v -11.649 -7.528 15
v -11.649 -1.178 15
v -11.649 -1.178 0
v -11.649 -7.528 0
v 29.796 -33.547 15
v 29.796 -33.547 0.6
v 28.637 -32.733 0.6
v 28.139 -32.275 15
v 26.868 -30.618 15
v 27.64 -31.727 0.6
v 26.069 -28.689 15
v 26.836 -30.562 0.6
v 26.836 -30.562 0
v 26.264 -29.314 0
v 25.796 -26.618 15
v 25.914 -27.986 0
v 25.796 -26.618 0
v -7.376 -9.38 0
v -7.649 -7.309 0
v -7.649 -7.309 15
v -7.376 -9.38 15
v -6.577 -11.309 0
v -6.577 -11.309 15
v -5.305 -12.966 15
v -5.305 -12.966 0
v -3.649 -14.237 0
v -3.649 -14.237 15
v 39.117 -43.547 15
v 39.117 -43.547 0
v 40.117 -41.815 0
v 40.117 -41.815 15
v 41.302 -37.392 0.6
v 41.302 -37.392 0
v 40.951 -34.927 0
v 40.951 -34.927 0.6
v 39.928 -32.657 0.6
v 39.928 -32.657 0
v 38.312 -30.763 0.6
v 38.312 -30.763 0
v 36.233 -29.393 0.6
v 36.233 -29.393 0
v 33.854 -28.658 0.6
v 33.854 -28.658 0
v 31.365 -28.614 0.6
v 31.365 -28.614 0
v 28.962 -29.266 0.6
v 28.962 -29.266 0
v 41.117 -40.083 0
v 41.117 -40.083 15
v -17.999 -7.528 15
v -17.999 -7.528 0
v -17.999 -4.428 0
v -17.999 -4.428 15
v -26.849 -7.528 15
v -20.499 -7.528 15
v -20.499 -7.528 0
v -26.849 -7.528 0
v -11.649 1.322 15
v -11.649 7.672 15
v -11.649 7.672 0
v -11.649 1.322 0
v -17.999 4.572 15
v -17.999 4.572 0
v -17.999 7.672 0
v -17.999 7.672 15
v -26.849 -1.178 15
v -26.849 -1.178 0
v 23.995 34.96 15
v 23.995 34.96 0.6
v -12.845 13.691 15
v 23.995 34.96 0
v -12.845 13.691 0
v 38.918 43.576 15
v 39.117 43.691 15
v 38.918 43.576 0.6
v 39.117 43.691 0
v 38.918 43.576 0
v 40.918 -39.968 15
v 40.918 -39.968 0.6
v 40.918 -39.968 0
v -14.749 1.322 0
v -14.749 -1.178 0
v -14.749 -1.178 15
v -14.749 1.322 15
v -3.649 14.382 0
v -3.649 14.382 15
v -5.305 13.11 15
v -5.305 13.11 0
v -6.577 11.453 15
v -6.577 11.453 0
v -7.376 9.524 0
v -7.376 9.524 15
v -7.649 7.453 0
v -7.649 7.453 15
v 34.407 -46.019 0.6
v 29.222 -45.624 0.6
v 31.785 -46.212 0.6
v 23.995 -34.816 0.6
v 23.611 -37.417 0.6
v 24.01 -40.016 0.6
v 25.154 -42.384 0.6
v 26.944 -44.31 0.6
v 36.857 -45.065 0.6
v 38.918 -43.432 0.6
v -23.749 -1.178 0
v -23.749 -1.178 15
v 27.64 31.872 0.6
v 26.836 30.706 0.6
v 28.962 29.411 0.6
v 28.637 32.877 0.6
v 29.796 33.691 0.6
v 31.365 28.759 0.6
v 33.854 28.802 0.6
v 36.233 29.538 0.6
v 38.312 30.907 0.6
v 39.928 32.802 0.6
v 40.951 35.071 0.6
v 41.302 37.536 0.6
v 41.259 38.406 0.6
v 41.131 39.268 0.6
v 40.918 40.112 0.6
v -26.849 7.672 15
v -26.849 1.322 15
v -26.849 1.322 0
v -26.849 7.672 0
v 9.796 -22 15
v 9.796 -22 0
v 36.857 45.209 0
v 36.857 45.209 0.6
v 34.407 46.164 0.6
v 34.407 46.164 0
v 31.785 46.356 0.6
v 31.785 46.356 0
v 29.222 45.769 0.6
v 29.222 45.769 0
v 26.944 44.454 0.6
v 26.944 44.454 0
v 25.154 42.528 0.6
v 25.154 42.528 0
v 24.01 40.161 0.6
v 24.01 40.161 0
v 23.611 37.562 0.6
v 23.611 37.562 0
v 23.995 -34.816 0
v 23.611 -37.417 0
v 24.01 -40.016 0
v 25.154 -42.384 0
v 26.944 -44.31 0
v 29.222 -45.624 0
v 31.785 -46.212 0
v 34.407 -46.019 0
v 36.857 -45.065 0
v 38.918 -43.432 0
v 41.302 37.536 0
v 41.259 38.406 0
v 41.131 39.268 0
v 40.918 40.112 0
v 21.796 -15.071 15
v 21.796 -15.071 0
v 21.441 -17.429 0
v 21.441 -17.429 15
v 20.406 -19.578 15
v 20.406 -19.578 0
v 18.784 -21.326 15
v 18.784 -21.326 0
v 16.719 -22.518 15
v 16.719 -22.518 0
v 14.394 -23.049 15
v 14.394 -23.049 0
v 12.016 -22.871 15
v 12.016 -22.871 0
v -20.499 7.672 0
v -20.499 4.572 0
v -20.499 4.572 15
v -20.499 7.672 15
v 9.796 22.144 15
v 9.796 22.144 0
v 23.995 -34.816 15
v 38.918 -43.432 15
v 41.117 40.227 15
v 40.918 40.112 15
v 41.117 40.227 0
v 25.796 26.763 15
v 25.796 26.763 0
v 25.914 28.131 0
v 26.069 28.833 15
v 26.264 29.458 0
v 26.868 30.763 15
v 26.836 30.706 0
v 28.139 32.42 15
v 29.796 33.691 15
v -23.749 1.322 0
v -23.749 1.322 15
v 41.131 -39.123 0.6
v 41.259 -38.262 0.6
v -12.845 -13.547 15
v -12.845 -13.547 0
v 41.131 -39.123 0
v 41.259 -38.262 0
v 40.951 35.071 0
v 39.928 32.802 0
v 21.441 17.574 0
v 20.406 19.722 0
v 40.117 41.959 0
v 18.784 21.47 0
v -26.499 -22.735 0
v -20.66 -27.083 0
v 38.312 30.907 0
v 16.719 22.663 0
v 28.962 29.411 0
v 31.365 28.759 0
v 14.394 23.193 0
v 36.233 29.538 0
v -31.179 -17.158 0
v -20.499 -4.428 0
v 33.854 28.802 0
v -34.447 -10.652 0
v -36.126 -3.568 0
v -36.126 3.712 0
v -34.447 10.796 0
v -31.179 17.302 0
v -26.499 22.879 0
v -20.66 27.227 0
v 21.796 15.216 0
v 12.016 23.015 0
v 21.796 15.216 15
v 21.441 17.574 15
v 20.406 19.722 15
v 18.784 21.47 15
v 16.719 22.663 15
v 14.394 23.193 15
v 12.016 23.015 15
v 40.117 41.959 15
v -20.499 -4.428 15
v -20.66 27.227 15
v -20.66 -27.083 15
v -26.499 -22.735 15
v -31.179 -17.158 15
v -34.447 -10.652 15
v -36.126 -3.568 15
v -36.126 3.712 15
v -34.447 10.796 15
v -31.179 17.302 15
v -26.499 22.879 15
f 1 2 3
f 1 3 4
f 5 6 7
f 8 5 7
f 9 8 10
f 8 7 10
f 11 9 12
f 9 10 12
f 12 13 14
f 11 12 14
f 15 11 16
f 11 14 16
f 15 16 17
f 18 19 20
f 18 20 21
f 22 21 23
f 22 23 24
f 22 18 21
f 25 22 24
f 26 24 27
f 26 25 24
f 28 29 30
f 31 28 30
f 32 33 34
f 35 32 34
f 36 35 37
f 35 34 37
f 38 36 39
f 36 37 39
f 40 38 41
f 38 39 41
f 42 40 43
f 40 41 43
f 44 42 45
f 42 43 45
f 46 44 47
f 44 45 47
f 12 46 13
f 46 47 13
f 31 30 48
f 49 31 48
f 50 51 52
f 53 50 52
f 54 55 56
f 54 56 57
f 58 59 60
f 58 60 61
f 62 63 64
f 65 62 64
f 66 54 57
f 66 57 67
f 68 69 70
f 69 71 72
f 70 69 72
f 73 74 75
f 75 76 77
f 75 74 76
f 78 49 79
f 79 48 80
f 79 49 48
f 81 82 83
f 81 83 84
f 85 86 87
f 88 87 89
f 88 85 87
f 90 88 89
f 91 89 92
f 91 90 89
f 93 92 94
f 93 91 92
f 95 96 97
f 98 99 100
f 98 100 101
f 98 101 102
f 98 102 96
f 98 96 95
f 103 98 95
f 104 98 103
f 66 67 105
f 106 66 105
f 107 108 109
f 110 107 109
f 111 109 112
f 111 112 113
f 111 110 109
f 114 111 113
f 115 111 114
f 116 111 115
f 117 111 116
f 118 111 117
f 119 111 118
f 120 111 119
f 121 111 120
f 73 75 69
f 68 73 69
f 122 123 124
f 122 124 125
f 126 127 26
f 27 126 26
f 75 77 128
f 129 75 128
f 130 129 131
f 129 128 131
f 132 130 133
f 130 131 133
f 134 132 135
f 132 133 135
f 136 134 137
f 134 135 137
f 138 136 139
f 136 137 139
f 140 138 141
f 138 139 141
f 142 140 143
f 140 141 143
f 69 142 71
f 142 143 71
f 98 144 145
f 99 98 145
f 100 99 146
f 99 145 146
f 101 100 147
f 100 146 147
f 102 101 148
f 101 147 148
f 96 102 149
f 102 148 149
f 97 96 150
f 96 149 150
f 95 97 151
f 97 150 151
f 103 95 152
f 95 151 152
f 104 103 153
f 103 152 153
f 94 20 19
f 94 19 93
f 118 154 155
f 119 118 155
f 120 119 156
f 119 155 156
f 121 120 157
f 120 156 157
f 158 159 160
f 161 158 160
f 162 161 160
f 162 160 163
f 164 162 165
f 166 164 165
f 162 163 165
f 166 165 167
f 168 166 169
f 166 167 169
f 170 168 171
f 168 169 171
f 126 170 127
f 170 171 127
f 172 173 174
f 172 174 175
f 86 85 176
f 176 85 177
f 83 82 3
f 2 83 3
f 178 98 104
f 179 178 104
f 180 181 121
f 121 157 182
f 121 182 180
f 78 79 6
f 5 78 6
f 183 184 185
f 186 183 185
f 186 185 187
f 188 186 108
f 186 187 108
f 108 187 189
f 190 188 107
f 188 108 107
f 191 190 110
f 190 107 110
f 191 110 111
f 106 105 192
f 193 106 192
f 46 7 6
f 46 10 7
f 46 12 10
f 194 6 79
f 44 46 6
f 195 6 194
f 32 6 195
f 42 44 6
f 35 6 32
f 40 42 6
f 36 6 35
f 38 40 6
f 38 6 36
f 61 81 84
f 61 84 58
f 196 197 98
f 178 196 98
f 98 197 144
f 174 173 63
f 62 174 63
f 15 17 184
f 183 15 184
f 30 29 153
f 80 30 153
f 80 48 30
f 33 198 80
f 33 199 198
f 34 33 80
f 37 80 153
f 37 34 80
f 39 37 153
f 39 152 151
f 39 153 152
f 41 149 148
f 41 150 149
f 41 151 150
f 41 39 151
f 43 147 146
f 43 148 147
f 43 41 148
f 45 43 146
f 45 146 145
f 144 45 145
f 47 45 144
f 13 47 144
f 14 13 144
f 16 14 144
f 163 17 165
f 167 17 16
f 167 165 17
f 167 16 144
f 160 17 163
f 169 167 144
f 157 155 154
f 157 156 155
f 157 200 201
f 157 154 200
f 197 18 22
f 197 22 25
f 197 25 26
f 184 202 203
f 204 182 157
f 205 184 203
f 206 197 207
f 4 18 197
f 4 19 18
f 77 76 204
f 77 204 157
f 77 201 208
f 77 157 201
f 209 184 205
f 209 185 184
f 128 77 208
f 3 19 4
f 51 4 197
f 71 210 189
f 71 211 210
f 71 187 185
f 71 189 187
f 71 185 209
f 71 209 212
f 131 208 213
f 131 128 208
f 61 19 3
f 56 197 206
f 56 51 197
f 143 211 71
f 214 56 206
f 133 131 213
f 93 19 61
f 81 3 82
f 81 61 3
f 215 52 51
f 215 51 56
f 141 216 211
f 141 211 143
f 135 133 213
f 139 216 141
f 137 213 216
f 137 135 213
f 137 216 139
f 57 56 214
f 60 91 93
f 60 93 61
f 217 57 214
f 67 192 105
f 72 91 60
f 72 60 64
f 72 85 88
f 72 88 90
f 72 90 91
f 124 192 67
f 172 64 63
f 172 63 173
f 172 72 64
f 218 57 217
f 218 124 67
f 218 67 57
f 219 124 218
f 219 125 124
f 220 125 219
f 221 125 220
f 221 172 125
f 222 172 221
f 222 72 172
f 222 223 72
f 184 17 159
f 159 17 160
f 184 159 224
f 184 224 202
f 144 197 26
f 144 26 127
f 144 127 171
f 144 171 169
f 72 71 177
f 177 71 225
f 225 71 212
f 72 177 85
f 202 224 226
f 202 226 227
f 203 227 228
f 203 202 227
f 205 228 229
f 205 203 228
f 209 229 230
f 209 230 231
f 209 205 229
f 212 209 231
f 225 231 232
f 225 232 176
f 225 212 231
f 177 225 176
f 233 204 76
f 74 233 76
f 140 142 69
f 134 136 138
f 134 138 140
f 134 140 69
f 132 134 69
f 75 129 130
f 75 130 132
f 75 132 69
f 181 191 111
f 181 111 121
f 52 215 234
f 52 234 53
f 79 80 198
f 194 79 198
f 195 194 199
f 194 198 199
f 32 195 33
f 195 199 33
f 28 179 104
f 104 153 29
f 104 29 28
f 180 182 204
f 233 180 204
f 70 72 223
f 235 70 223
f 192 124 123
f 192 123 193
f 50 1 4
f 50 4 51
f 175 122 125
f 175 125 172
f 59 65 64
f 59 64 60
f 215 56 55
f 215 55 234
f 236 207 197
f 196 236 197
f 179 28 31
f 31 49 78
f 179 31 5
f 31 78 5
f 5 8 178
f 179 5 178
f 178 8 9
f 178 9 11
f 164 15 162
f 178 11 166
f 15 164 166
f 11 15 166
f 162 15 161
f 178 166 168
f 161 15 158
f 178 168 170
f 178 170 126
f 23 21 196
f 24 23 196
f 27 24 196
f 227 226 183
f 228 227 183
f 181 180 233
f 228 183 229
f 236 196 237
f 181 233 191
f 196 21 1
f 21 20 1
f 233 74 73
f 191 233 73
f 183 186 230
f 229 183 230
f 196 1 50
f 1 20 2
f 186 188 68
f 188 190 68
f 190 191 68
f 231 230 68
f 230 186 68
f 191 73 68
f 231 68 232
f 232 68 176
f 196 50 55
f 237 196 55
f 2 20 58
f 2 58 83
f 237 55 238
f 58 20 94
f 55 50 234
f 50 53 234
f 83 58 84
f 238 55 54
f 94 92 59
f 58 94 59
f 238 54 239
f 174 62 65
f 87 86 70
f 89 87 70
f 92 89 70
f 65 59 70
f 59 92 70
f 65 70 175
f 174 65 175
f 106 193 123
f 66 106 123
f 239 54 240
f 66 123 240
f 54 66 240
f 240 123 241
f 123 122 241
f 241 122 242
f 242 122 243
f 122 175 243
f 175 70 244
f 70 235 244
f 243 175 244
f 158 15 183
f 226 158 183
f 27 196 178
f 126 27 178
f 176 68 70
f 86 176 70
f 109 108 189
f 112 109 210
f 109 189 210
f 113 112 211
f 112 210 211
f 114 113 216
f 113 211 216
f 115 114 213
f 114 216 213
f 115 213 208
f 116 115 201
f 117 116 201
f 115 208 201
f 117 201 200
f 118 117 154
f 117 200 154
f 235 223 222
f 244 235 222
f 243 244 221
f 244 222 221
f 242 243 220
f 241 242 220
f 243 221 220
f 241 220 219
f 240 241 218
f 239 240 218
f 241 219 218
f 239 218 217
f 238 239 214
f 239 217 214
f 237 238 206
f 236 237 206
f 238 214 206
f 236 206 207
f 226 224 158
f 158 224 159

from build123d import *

# Parameters (mm, degrees)
F0_W        = 2.5
F0_H        = 3.1
F0_W_2      = 3.1
F0_H_2      = 2.5
F1_DEPTH    = 15
F2_DEPTH    = 0.6
F3_T1_DEPTH = 15


# Not quite as in the source:
# - a fillet or chamfer that OpenCascade refuses, or shapes differently, is made with other operations: its cross-section is extruded or revolved along the edge and cut away or added


with BuildPart() as f1:
    # F0 (on Top) → F1 (new body)
    with BuildSketch(Plane.XY):
        with BuildLine():
            Line((39.1167589883, 43.6909709372), (38.9183741482, 43.5764333963))
            ThreePointArc((38.9183741482, 43.5764333963), (39.563732113, 42.8018800146), (40.1167589265, 41.9589202367))
            Line((40.1167589265, 41.9589202367), (39.1167589883, 43.6909709372))
        make_face()
        with BuildLine():
            ThreePointArc((40.1167589265, -41.8145826694), (39.563732113, -42.6575424473), (38.9183741482, -43.432095829))
            Line((38.9183741482, -43.432095829), (39.1167589883, -43.5466333699))
            Line((39.1167589883, -43.5466333699), (40.1167589265, -41.8145826694))
        make_face()
        with BuildLine():
            Line((41.1167589883, 40.226869322), (40.1167589265, 41.9589202367))
            ThreePointArc((40.1167589265, 41.9589202367), (40.5702701762, 41.0585049774), (40.9183741482, 40.1123317812))
            Line((40.9183741482, 40.1123317812), (41.1167589883, 40.226869322))
        make_face()
        with BuildLine():
            Line((41.1167589883, -40.0825317547), (40.9183741482, -39.9679942139))
            ThreePointArc((40.9183741482, -39.9679942139), (40.5702701762, -40.9141674102), (40.1167589265, -41.8145826694))
            Line((40.1167589265, -41.8145826694), (41.1167589883, -40.0825317547))
        make_face()
        with BuildLine():
            Line((38.9183741482, 43.5764333963), (23.9946357527, 34.9602090164))
            ThreePointArc((23.9946357527, 34.9602090164), (24.7962509126, 33.113620668), (25.9946357527, 31.4961074012))
            Line((25.9946357527, 31.4961074012), (40.9183741482, 40.1123317812))
            ThreePointArc((40.9183741482, 40.1123317812), (40.5702701762, 41.0585049774), (40.1167589265, 41.9589202367))
            ThreePointArc((40.1167589265, 41.9589202367), (39.563732113, 42.8018800146), (38.9183741482, 43.5764333963))
        make_face()
        with BuildLine():
            ThreePointArc((25.9946357527, -31.3517698339), (24.7962509126, -32.9692831007), (23.9946357527, -34.8158714491))
            Line((23.9946357527, -34.8158714491), (38.9183741482, -43.432095829))
            ThreePointArc((38.9183741482, -43.432095829), (39.563732113, -42.6575424473), (40.1167589265, -41.8145826694))
            ThreePointArc((40.1167589265, -41.8145826694), (40.5702701762, -40.9141674102), (40.9183741482, -39.9679942139))
            Line((40.9183741482, -39.9679942139), (25.9946357527, -31.3517698339))
        make_face()
        with BuildLine():
            Line((23.9946357527, 34.9602090164), (-12.8447652387, 13.6909709372))
            Line((-12.8447652387, 13.6909709372), (-20.6597652387, 27.2269479983))
            ThreePointArc((-20.6597652387, 27.2269479983), (-36.3375843281, 0.0721687836), (-20.6597652387, -27.082610431))
            Line((-20.6597652387, -27.082610431), (-12.8447652387, -13.5466333699))
            Line((-12.8447652387, -13.5466333699), (23.9946357527, -34.8158714491))
            ThreePointArc((23.9946357527, -34.8158714491), (24.7962509126, -32.9692831007), (25.9946357527, -31.3517698339))
            Line((25.9946357527, -31.3517698339), (25.7962509126, -31.2372322931))
            Line((25.7962509126, -31.2372322931), (25.7962509126, 31.3815698604))
            Line((25.7962509126, 31.3815698604), (25.9946357527, 31.4961074012))
            ThreePointArc((25.9946357527, 31.4961074012), (24.7962509126, 33.113620668), (23.9946357527, 34.9602090164))
        make_face()
        Polygon((-7.648612816, -11.9278312164), (-7.648612816, 12.0721687836), (21.7962509126, 29.0721687836), (21.7962509126, -28.9278312164), align=None, mode=Mode.SUBTRACT)
        Polygon((-17.998612816, 7.6721687836), (-11.648612816, 7.6721687836), (-11.648612816, 1.3221687836), (-11.648612816, -1.1778312164), (-11.648612816, -7.5278312164), (-17.998612816, -7.5278312164), (-20.498612816, -7.5278312164), (-26.848612816, -7.5278312164), (-26.848612816, -1.1778312164), (-26.848612816, 1.3221687836), (-26.848612816, 7.6721687836), (-20.498612816, 7.6721687836), align=None, mode=Mode.SUBTRACT)
        with Locations((-19.248612816, -5.9778312164)):
            Rectangle(F0_W, F0_H)
        with Locations((-13.198612816, 0.0721687836)):
            Rectangle(F0_W_2, F0_H_2)
        with Locations((-19.248612816, 6.1221687836)):
            Rectangle(F0_W, F0_H)
        with Locations((-25.298612816, 0.0721687836)):
            Rectangle(F0_W_2, F0_H_2)
    extrude(amount=F1_DEPTH)

    # F0 (on Top) → F2 (join)
    with BuildSketch(Plane.XY):
        with BuildLine():
            ThreePointArc((38.9183741482, 43.5764333963), (28.0338552197, 45.1965244366), (23.9946357527, 34.9602090164))
            Line((23.9946357527, 34.9602090164), (38.9183741482, 43.5764333963))
        make_face()
        with BuildLine():
            Line((39.1167589883, 43.6909709372), (38.9183741482, 43.5764333963))
            ThreePointArc((38.9183741482, 43.5764333963), (39.563732113, 42.8018800146), (40.1167589265, 41.9589202367))
            Line((40.1167589265, 41.9589202367), (39.1167589883, 43.6909709372))
        make_face()
        with BuildLine():
            Line((38.9183741482, -43.432095829), (23.9946357527, -34.8158714491))
            ThreePointArc((23.9946357527, -34.8158714491), (28.0338552197, -45.0521868693), (38.9183741482, -43.432095829))
        make_face()
        with BuildLine():
            ThreePointArc((40.1167589265, -41.8145826694), (39.563732113, -42.6575424473), (38.9183741482, -43.432095829))
            Line((38.9183741482, -43.432095829), (39.1167589883, -43.5466333699))
            Line((39.1167589883, -43.5466333699), (40.1167589265, -41.8145826694))
        make_face()
        with BuildLine():
            Line((41.1167589883, 40.226869322), (40.1167589265, 41.9589202367))
            ThreePointArc((40.1167589265, 41.9589202367), (40.5702701762, 41.0585049774), (40.9183741482, 40.1123317812))
            Line((40.9183741482, 40.1123317812), (41.1167589883, 40.226869322))
        make_face()
        with BuildLine():
            Line((40.9183741482, 40.1123317812), (25.9946357527, 31.4961074012))
            ThreePointArc((25.9946357527, 31.4961074012), (35.7032074646, 29.3083760539), (41.3018044121, 37.5362703988))
            ThreePointArc((41.3018044121, 37.5362703988), (41.2054217299, 38.8384907155), (40.9183741482, 40.1123317812))
        make_face()
        with BuildLine():
            ThreePointArc((41.3018044121, -37.3919328315), (35.7032074646, -29.1640384866), (25.9946357527, -31.3517698339))
            Line((25.9946357527, -31.3517698339), (40.9183741482, -39.9679942139))
            ThreePointArc((40.9183741482, -39.9679942139), (41.2054217299, -38.6941531482), (41.3018044121, -37.3919328315))
        make_face()
        with BuildLine():
            Line((41.1167589883, -40.0825317547), (40.9183741482, -39.9679942139))
            ThreePointArc((40.9183741482, -39.9679942139), (40.5702701762, -40.9141674102), (40.1167589265, -41.8145826694))
            Line((40.1167589265, -41.8145826694), (41.1167589883, -40.0825317547))
        make_face()
    extrude(amount=F2_DEPTH)

    # F3: fillet of radius 8 on 6 edges, made by hand

    # F3_s2 → F3_t1 (join)
    with BuildSketch(Plane.XY):
        with BuildLine():
            ThreePointArc((-3.648612816, 14.3815698604), (-6.5768160463, 11.4533666301), (-7.648612816, 7.4533666301))
            Line((-7.648612816, 7.4533666301), (-7.648612816, 12.0721687836))
            Line((-7.648612816, 12.0721687836), (-3.648612816, 14.3815698604))
        make_face()
        with BuildLine():
            ThreePointArc((25.7962509126, 26.7627677069), (26.8680476824, 30.7627677069), (29.7962509126, 33.6909709372))
            Line((29.7962509126, 33.6909709372), (25.7962509126, 31.3815698604))
            Line((25.7962509126, 31.3815698604), (25.7962509126, 26.7627677069))
        make_face()
        with BuildLine():
            ThreePointArc((21.7962509126, 15.2157623231), (17.7962509126, 22.1439655534), (9.7962509126, 22.1439655534))
            Line((9.7962509126, 22.1439655534), (21.7962509126, 29.0721687836))
            Line((21.7962509126, 29.0721687836), (21.7962509126, 15.2157623231))
        make_face()
        with BuildLine():
            ThreePointArc((21.7962509126, -15.0714247558), (17.7962509126, -21.9996279861), (9.7962509126, -21.9996279861))
            Line((9.7962509126, -21.9996279861), (21.7962509126, -28.9278312164))
            Line((21.7962509126, -28.9278312164), (21.7962509126, -15.0714247558))
        make_face()
        with BuildLine():
            ThreePointArc((29.7962509126, -33.5466333699), (26.8680476824, -30.6184301396), (25.7962509126, -26.6184301396))
            Line((25.7962509126, -26.6184301396), (25.7962509126, -31.2372322931))
            Line((25.7962509126, -31.2372322931), (29.7962509126, -33.5466333699))
        make_face()
        with BuildLine():
            ThreePointArc((-7.648612816, -7.3090290628), (-6.5768160463, -11.3090290628), (-3.648612816, -14.2372322931))
            Line((-3.648612816, -14.2372322931), (-7.648612816, -11.9278312164))
            Line((-7.648612816, -11.9278312164), (-7.648612816, -7.3090290628))
        make_face()
    extrude(amount=F3_T1_DEPTH)


solid = f1.part
